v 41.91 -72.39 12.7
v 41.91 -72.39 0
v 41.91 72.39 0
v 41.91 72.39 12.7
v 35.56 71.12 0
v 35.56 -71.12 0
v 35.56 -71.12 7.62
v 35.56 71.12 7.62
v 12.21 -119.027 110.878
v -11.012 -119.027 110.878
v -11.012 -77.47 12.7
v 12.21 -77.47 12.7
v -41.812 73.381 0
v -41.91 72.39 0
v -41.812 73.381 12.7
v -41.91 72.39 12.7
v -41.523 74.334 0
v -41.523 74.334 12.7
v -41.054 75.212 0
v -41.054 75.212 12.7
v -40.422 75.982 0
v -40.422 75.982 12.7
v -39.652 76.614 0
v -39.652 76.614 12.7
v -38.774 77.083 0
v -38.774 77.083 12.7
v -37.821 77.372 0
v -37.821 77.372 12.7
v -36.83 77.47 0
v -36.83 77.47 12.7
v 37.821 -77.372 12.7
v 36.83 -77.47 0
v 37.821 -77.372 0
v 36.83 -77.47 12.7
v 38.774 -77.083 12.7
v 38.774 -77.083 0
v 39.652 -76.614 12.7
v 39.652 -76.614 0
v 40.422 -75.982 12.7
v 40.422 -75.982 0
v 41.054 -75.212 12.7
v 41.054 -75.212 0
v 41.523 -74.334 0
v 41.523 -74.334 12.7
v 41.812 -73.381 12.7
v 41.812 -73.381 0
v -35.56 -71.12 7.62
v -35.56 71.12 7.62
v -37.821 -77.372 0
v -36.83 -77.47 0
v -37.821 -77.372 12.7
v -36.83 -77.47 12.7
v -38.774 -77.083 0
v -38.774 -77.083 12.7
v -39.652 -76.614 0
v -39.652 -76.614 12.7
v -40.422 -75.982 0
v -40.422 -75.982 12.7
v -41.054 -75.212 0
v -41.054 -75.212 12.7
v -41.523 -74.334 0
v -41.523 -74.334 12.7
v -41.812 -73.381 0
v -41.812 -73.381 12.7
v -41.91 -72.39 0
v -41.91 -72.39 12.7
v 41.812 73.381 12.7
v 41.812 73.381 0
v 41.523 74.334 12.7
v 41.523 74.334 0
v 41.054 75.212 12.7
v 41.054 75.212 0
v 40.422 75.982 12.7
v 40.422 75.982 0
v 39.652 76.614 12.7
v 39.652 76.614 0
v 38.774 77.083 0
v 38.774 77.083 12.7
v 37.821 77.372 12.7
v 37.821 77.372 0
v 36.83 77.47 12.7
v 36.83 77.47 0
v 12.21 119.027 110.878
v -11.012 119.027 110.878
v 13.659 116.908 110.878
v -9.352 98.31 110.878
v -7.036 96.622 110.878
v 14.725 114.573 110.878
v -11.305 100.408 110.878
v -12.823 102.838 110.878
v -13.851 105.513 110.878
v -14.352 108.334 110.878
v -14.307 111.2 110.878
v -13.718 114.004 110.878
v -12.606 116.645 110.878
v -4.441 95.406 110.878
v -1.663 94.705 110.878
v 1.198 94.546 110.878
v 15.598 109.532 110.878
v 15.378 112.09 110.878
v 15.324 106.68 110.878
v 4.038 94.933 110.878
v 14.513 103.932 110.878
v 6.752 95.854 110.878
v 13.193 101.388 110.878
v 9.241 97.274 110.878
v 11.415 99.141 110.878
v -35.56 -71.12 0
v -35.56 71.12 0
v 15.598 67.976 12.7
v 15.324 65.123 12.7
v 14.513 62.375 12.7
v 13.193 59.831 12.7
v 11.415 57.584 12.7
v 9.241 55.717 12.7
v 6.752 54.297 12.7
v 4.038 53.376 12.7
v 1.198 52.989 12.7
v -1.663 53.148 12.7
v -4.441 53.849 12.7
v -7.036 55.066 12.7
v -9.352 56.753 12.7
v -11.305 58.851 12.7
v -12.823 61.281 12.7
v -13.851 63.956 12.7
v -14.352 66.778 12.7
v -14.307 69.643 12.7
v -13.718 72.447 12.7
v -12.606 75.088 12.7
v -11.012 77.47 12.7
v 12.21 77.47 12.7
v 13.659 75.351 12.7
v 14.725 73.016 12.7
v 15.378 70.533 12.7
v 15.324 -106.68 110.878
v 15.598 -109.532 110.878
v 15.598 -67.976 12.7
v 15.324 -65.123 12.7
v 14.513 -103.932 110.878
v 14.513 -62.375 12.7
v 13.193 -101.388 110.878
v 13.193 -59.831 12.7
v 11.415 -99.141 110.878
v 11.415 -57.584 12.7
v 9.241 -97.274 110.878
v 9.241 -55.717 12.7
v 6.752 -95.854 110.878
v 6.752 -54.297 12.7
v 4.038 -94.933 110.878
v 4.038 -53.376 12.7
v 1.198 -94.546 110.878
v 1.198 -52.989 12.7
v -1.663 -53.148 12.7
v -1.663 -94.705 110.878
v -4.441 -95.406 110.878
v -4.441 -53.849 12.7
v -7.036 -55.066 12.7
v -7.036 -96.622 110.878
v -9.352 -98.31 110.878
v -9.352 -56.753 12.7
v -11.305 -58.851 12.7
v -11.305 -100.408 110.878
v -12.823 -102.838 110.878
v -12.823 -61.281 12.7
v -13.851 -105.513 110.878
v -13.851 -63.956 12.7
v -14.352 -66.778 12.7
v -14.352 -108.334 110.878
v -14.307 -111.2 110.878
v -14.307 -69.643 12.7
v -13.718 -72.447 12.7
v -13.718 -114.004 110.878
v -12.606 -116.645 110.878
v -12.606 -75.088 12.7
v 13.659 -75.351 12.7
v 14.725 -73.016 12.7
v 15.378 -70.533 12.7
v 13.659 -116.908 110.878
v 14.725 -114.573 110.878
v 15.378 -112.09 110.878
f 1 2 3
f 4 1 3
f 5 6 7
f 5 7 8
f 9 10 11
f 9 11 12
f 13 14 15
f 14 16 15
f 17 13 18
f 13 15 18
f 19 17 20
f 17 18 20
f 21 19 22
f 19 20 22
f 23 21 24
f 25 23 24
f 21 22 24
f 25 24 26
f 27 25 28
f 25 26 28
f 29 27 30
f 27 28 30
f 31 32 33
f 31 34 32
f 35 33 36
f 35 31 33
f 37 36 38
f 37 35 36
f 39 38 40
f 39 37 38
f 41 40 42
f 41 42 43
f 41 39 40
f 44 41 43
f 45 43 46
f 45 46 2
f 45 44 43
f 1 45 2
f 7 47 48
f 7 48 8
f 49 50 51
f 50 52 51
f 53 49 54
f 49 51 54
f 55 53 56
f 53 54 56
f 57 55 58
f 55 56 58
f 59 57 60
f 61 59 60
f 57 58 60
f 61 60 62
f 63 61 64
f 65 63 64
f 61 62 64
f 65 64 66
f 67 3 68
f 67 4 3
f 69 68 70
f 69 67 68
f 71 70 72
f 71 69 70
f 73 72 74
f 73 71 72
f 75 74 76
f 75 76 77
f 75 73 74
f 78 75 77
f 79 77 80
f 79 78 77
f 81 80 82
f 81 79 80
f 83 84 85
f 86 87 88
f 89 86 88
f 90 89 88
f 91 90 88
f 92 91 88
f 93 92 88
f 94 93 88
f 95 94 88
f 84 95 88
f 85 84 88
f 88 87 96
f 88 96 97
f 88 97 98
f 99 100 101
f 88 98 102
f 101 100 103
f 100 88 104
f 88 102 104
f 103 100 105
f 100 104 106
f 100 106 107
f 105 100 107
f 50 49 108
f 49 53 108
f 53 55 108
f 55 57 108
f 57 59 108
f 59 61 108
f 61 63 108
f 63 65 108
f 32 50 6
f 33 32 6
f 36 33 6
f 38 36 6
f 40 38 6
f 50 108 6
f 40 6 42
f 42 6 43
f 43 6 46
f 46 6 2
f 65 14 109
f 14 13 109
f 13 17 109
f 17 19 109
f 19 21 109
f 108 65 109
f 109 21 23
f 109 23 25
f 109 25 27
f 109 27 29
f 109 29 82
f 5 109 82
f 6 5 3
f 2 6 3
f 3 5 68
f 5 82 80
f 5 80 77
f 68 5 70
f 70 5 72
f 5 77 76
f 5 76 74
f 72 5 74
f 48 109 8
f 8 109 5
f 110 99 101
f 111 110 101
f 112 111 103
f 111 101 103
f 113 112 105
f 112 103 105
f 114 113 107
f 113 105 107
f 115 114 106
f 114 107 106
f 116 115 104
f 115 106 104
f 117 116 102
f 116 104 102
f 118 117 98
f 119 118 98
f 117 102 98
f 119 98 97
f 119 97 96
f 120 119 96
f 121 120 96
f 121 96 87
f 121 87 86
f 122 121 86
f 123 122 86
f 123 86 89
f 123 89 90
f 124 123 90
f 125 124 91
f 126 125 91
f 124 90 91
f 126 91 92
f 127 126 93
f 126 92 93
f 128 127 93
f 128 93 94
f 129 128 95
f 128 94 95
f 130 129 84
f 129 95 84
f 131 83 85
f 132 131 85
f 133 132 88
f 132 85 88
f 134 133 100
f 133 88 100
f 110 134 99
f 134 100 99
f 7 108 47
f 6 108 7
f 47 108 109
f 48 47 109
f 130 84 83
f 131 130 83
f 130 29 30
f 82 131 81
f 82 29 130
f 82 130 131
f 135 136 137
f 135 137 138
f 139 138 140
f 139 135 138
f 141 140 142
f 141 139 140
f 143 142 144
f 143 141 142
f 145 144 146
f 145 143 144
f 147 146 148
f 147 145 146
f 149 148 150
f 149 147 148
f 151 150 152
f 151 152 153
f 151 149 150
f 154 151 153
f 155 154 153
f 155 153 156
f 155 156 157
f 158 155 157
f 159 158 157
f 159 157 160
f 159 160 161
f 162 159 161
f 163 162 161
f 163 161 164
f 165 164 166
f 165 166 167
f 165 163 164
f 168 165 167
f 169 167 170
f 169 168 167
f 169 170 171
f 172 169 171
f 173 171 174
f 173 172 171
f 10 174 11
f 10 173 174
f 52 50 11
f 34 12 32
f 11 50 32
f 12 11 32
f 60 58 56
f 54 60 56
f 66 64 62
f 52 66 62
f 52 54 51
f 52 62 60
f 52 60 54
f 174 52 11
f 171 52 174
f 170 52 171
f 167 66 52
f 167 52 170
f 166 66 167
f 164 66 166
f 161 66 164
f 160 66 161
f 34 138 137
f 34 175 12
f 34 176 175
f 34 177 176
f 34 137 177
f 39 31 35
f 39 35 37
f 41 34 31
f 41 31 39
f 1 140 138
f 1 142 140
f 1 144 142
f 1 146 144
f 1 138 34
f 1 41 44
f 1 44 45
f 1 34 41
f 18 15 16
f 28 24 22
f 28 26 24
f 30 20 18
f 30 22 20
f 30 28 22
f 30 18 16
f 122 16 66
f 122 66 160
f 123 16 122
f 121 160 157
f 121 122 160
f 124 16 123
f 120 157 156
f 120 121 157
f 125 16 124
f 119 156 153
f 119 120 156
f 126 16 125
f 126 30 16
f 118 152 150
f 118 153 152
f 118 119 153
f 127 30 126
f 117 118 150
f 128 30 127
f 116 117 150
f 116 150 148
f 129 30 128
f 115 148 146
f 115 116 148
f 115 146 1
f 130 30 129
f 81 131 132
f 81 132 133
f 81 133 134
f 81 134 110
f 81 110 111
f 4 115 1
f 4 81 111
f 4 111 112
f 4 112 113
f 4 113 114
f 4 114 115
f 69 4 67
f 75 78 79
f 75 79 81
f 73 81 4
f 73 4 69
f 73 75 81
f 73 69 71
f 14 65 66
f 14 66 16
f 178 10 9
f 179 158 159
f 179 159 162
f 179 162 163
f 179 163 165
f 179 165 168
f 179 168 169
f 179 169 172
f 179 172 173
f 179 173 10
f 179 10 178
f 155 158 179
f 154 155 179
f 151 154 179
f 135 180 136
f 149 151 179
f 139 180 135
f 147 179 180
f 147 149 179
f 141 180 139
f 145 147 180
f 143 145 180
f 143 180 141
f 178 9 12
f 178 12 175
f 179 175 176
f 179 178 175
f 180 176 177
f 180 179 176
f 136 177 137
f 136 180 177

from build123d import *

# Parameters (mm, degrees)
F0_W     = 83.82
F0_H     = 154.94
F1_DEPTH = 12.7
F2_W     = 71.12
F2_H     = 142.24
F3_DEPTH = 7.62
F4_R     = 5.08
F5_R     = 5.08
F6_R     = 5.08
F7_R     = 5.08


with BuildPart() as f1:
    # F0 (on Top) → F1 (new body)
    with BuildSketch(Plane.XY):
        Rectangle(F0_W, F0_H)
    extrude(amount=F1_DEPTH)

    # F2 (on Top) → F3 (cut)
    with BuildSketch(Plane.XY):
        Rectangle(F2_W, F2_H)
    extrude(amount=F3_DEPTH, mode=Mode.SUBTRACT)

    # F4
    f4_edges = [f1.edges().sort_by_distance(p)[0] for p in [
        (41.91, -77.47, 6.35),
    ]]
    fillet(f4_edges, radius=F4_R)

    # F5
    f5_edges = [f1.edges().sort_by_distance(p)[0] for p in [
        (41.91, 77.47, 6.35),
    ]]
    fillet(f5_edges, radius=F5_R)

    # F6
    f6_edges = [f1.edges().sort_by_distance(p)[0] for p in [
        (-41.91, -77.47, 6.35),
    ]]
    fillet(f6_edges, radius=F6_R)

    # F7
    f7_edges = [f1.edges().sort_by_distance(p)[0] for p in [
        (-41.91, 77.47, 6.35),
    ]]
    fillet(f7_edges, radius=F7_R)

    # F10: sweep along a path in F9
    with BuildLine(Plane.YZ) as f10_path:
        Line((-68.238609, 13.756951), (-109.795533, 111.935183))
    # F8 (on face) → F10 (sweep)
    with BuildSketch(Plane.XY.offset(12.7)):
        with BuildLine():
            ThreePointArc((12.210004, -77.47), (14.725381, -73.015905), (15.59766, -67.975546))
            ThreePointArc((15.59766, -67.975546), (-4.441399, -53.849124), (-11.012084, -77.47))
            Line((-11.012084, -77.47), (12.210004, -77.47))
        make_face()
    sweep(path=f10_path.line)

    # F11: F1 across plane


with BuildPart() as f1_1:
    add(f1.part)
    add(f1.part.mirror(Plane.XZ))


solid = f1_1.part
